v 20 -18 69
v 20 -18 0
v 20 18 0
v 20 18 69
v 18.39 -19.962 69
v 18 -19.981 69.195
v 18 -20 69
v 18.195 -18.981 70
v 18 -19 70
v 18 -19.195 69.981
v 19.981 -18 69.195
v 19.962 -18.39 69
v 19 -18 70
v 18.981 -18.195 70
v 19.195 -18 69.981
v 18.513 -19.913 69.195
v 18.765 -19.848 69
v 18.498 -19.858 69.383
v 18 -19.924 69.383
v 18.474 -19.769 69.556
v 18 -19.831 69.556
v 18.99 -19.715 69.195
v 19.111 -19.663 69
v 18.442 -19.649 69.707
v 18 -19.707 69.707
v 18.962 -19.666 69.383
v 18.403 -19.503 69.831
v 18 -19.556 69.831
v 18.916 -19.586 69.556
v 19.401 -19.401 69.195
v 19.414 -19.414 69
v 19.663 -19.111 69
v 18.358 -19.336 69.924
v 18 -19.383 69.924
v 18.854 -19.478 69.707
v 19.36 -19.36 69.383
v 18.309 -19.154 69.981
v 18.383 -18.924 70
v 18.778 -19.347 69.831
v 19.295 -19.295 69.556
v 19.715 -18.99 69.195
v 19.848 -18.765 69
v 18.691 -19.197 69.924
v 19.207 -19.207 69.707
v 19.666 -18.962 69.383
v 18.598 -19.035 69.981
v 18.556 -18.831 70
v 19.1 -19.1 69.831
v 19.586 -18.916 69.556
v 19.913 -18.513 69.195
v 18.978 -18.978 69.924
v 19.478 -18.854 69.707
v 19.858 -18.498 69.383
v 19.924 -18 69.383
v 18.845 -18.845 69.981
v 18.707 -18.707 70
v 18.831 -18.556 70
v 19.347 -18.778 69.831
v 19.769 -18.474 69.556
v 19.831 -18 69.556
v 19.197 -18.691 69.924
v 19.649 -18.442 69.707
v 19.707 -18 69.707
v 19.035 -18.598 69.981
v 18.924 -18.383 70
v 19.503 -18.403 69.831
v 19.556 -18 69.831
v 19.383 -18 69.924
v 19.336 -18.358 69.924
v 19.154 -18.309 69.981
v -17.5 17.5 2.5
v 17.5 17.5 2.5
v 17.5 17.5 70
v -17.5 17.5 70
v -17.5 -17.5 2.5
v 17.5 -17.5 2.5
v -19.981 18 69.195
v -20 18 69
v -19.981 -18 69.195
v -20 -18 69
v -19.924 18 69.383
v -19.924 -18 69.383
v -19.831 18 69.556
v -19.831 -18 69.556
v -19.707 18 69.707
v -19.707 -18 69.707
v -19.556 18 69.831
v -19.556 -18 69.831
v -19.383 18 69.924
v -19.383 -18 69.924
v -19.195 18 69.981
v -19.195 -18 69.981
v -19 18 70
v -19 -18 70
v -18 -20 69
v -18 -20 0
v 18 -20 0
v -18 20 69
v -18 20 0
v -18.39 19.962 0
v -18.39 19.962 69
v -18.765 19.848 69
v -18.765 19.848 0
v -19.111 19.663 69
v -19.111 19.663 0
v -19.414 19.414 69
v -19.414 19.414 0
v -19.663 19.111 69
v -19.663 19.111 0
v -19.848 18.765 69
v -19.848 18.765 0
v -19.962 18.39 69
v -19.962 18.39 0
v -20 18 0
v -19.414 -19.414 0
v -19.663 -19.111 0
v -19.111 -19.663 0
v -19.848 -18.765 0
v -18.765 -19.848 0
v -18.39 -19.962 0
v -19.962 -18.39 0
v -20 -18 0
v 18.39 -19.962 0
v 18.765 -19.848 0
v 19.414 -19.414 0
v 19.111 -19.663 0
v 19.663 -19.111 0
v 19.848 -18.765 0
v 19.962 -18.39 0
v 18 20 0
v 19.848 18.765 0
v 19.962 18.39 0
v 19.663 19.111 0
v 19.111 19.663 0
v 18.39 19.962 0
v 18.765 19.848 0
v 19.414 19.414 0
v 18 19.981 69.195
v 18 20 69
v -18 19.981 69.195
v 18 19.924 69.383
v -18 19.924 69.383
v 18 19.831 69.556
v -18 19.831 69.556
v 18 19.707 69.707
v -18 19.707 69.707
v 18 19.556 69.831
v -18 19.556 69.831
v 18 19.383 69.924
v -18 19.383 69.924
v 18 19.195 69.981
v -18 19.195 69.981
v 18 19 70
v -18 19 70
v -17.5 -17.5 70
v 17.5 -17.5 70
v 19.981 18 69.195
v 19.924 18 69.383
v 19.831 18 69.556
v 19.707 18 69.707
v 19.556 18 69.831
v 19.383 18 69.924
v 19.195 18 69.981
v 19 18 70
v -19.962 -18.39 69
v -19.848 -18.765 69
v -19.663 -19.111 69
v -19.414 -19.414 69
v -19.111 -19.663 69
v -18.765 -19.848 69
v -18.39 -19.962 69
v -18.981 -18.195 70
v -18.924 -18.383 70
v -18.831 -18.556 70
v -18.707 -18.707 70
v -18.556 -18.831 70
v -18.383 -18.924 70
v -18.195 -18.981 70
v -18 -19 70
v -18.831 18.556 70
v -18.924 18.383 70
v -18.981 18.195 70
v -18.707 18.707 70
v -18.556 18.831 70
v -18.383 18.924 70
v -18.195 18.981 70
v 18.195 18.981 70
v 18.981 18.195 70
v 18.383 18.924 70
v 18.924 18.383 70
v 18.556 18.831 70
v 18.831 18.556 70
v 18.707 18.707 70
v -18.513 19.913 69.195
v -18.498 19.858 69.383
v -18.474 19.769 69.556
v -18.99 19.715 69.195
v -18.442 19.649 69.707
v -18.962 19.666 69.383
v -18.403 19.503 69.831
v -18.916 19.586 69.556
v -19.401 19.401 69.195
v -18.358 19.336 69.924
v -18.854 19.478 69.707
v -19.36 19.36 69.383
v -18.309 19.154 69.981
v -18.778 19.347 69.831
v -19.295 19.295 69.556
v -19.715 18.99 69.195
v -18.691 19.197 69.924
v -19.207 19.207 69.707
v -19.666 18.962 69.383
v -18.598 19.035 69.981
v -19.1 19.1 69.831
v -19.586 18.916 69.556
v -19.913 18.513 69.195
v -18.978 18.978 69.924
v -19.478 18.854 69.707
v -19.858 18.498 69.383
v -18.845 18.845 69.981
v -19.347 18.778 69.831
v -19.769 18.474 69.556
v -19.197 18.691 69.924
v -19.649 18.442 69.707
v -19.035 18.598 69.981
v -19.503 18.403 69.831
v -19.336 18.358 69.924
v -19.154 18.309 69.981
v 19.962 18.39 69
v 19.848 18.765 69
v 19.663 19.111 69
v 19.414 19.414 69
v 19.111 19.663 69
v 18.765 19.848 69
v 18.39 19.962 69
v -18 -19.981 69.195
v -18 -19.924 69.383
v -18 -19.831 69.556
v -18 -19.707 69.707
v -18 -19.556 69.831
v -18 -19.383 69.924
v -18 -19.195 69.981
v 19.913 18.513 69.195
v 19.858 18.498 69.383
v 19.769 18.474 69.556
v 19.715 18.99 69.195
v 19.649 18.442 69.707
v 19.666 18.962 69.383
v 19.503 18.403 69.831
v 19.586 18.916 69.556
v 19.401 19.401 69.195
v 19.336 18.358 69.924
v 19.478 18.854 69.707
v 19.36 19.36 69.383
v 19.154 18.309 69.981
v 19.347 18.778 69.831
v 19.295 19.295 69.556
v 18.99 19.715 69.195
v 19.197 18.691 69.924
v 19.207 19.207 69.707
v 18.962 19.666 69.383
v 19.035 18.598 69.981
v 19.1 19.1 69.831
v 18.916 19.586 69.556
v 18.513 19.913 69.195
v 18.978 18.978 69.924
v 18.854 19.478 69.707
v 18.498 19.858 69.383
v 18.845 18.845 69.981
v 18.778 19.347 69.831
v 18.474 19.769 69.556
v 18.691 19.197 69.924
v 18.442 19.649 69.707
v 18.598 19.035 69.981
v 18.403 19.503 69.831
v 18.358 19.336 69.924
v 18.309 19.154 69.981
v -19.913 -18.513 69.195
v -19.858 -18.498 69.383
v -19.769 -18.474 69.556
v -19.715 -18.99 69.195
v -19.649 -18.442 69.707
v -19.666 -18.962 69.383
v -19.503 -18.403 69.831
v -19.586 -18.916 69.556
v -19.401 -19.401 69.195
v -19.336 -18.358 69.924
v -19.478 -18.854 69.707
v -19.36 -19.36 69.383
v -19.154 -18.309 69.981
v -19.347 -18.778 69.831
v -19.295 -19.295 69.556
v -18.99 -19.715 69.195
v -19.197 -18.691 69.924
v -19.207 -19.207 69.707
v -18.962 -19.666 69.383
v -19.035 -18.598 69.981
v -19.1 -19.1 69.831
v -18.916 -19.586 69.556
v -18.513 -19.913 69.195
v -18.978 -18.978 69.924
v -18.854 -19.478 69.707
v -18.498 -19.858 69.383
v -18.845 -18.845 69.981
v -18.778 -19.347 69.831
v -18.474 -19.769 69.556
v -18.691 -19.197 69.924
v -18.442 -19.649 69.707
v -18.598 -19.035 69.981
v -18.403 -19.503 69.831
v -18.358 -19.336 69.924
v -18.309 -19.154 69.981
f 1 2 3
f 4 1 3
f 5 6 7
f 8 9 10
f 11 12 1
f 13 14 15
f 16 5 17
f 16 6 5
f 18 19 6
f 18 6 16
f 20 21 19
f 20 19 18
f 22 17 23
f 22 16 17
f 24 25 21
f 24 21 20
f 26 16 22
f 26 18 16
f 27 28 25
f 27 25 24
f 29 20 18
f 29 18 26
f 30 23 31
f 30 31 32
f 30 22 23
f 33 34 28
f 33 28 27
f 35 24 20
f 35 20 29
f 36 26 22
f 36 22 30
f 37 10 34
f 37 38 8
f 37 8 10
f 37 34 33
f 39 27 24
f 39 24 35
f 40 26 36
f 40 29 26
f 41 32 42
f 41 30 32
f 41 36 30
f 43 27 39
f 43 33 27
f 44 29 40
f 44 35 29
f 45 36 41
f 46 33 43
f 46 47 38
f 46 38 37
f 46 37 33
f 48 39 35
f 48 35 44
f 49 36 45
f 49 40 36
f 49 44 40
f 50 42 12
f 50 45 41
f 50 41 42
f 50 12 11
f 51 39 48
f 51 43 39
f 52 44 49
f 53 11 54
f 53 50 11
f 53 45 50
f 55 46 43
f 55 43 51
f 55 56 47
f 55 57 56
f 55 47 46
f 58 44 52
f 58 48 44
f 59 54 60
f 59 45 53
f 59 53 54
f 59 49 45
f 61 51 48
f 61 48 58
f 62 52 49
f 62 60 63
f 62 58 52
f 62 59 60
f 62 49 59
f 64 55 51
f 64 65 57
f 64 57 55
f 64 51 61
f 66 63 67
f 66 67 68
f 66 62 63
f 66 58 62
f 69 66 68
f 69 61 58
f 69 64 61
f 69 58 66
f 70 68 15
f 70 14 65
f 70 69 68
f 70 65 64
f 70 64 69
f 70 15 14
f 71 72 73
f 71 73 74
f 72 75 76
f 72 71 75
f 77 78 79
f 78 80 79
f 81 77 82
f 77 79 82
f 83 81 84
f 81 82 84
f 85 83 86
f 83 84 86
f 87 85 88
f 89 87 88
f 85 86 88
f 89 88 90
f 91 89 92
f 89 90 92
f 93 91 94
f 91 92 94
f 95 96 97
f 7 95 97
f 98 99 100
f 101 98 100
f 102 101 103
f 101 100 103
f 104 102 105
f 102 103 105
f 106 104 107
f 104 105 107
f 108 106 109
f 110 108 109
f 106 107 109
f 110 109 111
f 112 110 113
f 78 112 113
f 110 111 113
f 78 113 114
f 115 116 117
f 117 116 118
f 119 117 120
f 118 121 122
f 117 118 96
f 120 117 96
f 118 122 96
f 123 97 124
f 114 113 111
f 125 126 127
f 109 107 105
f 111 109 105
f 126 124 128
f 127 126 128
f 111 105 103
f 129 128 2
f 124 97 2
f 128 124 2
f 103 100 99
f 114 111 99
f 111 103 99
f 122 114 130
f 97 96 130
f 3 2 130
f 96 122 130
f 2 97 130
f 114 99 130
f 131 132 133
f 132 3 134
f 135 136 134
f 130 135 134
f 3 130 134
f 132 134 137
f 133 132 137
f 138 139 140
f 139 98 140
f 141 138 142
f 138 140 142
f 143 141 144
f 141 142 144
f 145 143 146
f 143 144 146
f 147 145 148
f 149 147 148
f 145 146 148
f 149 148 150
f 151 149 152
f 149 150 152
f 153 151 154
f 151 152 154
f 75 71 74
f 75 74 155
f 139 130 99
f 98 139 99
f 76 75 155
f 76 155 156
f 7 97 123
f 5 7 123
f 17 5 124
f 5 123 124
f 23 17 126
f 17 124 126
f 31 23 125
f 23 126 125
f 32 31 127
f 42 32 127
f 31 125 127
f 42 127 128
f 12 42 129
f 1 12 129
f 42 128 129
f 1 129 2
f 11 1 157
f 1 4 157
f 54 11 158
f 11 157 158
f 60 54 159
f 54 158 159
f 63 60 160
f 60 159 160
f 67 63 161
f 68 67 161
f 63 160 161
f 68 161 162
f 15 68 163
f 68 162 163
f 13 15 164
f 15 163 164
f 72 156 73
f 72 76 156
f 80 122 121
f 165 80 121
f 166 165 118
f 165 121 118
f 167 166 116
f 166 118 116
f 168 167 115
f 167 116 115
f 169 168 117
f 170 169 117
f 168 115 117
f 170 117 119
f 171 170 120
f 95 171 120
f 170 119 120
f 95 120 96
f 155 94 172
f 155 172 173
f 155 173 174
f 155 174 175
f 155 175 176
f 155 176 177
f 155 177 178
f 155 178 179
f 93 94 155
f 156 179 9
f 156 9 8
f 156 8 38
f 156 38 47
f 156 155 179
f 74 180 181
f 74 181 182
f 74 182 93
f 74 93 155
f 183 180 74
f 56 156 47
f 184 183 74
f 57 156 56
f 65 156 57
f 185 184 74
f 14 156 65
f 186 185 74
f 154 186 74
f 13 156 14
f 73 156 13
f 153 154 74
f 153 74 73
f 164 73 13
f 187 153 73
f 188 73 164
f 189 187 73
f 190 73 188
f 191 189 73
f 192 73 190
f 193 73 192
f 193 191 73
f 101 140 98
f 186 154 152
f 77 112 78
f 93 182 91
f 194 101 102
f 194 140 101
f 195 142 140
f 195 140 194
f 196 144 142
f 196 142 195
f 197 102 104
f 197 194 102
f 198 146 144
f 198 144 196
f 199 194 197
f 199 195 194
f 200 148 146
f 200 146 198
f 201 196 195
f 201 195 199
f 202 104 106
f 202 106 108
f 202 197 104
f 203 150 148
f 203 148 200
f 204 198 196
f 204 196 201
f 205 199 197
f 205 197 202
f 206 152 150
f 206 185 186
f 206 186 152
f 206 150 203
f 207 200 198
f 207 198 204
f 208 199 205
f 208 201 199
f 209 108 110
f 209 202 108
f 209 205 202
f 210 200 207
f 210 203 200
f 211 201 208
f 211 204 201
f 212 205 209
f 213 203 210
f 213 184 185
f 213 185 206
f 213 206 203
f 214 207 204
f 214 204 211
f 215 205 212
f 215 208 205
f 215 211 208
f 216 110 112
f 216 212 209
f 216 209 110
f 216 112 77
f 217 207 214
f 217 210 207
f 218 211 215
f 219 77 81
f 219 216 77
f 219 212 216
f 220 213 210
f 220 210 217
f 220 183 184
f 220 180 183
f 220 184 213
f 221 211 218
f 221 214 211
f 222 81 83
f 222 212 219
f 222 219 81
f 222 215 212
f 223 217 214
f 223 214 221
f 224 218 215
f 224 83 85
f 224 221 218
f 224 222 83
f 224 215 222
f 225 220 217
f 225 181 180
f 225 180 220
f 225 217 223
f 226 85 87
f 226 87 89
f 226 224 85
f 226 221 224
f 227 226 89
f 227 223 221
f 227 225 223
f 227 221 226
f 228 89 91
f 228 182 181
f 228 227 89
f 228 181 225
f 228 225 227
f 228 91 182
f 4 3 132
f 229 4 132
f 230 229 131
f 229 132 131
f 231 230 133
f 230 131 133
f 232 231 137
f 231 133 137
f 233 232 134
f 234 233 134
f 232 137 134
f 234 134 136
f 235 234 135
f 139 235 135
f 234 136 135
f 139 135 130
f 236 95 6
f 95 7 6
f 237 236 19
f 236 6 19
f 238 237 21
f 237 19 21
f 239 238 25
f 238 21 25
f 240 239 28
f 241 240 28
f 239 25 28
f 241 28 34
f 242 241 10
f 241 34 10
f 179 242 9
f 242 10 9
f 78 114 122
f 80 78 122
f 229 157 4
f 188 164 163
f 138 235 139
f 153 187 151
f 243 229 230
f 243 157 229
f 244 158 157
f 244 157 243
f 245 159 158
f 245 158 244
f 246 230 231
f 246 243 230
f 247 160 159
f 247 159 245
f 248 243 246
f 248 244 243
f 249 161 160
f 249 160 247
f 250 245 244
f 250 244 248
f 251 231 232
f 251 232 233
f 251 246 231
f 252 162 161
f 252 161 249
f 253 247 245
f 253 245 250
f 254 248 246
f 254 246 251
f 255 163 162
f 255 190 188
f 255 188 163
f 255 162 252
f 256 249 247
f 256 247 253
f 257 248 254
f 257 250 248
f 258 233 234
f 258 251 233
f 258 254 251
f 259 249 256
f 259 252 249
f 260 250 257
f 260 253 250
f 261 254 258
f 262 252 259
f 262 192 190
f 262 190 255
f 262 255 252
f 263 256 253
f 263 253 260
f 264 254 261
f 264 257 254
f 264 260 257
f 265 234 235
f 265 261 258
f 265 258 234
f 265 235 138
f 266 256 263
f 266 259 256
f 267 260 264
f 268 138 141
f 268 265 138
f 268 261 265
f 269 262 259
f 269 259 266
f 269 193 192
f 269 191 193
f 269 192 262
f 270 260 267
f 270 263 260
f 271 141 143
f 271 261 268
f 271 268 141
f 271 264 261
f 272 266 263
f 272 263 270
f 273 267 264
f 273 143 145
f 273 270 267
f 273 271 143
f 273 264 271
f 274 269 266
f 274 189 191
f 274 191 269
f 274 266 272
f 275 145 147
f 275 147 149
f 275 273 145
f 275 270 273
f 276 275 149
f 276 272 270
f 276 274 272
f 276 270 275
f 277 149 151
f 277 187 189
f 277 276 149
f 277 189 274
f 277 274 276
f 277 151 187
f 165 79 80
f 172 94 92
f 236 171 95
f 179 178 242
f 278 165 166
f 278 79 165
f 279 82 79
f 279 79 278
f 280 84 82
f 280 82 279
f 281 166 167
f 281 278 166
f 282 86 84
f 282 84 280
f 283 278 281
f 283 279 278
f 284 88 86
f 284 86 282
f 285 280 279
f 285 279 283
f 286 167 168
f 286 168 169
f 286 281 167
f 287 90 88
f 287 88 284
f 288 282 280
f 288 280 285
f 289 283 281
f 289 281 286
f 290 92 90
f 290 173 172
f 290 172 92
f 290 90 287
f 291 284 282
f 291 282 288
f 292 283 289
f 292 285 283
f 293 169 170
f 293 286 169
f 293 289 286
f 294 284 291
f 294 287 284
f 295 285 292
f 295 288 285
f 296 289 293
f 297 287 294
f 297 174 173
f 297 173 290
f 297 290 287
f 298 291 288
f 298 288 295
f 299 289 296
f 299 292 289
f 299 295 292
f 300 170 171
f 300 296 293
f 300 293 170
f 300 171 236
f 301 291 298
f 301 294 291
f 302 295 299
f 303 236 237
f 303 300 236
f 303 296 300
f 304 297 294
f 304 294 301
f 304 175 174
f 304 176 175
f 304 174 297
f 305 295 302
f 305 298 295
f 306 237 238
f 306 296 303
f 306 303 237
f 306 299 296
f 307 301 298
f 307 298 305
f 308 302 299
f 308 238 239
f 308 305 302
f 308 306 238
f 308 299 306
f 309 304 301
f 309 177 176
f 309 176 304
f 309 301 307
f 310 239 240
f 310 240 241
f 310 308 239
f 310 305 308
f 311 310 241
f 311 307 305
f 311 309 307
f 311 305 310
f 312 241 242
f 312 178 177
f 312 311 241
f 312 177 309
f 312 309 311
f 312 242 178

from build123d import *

# Parameters (mm, degrees)
F1_DEPTH = 70
F2_T     = -2.5
F3_R     = 1


with BuildPart() as f1:
    # F0 (on Top) → F1 (new body)
    with BuildSketch(Plane.XY):
        with BuildLine():
            ThreePointArc((20, 18), (19.4142135624, 19.4142135624), (18, 20))
            Line((18, 20), (-18, 20))
            ThreePointArc((-18, 20), (-19.4142135624, 19.4142135624), (-20, 18))
            Line((-20, 18), (-20, -18))
            ThreePointArc((-20, -18), (-19.4142135624, -19.4142135624), (-18, -20))
            Line((-18, -20), (18, -20))
            ThreePointArc((18, -20), (19.4142135624, -19.4142135624), (20, -18))
            Line((20, -18), (20, 18))
        make_face()
    extrude(amount=F1_DEPTH)

    # F2
    f2_openings = [f1.faces().sort_by_distance(p)[0] for p in [
        (0, 0, 70),
    ]]
    offset(amount=F2_T, openings=f2_openings)

    # F3
    f3_edges = [f1.edges().sort_by_distance(p)[0] for p in [
        (0, -20, 70),
    ]]
    fillet(f3_edges, radius=F3_R)


solid = f1.part
